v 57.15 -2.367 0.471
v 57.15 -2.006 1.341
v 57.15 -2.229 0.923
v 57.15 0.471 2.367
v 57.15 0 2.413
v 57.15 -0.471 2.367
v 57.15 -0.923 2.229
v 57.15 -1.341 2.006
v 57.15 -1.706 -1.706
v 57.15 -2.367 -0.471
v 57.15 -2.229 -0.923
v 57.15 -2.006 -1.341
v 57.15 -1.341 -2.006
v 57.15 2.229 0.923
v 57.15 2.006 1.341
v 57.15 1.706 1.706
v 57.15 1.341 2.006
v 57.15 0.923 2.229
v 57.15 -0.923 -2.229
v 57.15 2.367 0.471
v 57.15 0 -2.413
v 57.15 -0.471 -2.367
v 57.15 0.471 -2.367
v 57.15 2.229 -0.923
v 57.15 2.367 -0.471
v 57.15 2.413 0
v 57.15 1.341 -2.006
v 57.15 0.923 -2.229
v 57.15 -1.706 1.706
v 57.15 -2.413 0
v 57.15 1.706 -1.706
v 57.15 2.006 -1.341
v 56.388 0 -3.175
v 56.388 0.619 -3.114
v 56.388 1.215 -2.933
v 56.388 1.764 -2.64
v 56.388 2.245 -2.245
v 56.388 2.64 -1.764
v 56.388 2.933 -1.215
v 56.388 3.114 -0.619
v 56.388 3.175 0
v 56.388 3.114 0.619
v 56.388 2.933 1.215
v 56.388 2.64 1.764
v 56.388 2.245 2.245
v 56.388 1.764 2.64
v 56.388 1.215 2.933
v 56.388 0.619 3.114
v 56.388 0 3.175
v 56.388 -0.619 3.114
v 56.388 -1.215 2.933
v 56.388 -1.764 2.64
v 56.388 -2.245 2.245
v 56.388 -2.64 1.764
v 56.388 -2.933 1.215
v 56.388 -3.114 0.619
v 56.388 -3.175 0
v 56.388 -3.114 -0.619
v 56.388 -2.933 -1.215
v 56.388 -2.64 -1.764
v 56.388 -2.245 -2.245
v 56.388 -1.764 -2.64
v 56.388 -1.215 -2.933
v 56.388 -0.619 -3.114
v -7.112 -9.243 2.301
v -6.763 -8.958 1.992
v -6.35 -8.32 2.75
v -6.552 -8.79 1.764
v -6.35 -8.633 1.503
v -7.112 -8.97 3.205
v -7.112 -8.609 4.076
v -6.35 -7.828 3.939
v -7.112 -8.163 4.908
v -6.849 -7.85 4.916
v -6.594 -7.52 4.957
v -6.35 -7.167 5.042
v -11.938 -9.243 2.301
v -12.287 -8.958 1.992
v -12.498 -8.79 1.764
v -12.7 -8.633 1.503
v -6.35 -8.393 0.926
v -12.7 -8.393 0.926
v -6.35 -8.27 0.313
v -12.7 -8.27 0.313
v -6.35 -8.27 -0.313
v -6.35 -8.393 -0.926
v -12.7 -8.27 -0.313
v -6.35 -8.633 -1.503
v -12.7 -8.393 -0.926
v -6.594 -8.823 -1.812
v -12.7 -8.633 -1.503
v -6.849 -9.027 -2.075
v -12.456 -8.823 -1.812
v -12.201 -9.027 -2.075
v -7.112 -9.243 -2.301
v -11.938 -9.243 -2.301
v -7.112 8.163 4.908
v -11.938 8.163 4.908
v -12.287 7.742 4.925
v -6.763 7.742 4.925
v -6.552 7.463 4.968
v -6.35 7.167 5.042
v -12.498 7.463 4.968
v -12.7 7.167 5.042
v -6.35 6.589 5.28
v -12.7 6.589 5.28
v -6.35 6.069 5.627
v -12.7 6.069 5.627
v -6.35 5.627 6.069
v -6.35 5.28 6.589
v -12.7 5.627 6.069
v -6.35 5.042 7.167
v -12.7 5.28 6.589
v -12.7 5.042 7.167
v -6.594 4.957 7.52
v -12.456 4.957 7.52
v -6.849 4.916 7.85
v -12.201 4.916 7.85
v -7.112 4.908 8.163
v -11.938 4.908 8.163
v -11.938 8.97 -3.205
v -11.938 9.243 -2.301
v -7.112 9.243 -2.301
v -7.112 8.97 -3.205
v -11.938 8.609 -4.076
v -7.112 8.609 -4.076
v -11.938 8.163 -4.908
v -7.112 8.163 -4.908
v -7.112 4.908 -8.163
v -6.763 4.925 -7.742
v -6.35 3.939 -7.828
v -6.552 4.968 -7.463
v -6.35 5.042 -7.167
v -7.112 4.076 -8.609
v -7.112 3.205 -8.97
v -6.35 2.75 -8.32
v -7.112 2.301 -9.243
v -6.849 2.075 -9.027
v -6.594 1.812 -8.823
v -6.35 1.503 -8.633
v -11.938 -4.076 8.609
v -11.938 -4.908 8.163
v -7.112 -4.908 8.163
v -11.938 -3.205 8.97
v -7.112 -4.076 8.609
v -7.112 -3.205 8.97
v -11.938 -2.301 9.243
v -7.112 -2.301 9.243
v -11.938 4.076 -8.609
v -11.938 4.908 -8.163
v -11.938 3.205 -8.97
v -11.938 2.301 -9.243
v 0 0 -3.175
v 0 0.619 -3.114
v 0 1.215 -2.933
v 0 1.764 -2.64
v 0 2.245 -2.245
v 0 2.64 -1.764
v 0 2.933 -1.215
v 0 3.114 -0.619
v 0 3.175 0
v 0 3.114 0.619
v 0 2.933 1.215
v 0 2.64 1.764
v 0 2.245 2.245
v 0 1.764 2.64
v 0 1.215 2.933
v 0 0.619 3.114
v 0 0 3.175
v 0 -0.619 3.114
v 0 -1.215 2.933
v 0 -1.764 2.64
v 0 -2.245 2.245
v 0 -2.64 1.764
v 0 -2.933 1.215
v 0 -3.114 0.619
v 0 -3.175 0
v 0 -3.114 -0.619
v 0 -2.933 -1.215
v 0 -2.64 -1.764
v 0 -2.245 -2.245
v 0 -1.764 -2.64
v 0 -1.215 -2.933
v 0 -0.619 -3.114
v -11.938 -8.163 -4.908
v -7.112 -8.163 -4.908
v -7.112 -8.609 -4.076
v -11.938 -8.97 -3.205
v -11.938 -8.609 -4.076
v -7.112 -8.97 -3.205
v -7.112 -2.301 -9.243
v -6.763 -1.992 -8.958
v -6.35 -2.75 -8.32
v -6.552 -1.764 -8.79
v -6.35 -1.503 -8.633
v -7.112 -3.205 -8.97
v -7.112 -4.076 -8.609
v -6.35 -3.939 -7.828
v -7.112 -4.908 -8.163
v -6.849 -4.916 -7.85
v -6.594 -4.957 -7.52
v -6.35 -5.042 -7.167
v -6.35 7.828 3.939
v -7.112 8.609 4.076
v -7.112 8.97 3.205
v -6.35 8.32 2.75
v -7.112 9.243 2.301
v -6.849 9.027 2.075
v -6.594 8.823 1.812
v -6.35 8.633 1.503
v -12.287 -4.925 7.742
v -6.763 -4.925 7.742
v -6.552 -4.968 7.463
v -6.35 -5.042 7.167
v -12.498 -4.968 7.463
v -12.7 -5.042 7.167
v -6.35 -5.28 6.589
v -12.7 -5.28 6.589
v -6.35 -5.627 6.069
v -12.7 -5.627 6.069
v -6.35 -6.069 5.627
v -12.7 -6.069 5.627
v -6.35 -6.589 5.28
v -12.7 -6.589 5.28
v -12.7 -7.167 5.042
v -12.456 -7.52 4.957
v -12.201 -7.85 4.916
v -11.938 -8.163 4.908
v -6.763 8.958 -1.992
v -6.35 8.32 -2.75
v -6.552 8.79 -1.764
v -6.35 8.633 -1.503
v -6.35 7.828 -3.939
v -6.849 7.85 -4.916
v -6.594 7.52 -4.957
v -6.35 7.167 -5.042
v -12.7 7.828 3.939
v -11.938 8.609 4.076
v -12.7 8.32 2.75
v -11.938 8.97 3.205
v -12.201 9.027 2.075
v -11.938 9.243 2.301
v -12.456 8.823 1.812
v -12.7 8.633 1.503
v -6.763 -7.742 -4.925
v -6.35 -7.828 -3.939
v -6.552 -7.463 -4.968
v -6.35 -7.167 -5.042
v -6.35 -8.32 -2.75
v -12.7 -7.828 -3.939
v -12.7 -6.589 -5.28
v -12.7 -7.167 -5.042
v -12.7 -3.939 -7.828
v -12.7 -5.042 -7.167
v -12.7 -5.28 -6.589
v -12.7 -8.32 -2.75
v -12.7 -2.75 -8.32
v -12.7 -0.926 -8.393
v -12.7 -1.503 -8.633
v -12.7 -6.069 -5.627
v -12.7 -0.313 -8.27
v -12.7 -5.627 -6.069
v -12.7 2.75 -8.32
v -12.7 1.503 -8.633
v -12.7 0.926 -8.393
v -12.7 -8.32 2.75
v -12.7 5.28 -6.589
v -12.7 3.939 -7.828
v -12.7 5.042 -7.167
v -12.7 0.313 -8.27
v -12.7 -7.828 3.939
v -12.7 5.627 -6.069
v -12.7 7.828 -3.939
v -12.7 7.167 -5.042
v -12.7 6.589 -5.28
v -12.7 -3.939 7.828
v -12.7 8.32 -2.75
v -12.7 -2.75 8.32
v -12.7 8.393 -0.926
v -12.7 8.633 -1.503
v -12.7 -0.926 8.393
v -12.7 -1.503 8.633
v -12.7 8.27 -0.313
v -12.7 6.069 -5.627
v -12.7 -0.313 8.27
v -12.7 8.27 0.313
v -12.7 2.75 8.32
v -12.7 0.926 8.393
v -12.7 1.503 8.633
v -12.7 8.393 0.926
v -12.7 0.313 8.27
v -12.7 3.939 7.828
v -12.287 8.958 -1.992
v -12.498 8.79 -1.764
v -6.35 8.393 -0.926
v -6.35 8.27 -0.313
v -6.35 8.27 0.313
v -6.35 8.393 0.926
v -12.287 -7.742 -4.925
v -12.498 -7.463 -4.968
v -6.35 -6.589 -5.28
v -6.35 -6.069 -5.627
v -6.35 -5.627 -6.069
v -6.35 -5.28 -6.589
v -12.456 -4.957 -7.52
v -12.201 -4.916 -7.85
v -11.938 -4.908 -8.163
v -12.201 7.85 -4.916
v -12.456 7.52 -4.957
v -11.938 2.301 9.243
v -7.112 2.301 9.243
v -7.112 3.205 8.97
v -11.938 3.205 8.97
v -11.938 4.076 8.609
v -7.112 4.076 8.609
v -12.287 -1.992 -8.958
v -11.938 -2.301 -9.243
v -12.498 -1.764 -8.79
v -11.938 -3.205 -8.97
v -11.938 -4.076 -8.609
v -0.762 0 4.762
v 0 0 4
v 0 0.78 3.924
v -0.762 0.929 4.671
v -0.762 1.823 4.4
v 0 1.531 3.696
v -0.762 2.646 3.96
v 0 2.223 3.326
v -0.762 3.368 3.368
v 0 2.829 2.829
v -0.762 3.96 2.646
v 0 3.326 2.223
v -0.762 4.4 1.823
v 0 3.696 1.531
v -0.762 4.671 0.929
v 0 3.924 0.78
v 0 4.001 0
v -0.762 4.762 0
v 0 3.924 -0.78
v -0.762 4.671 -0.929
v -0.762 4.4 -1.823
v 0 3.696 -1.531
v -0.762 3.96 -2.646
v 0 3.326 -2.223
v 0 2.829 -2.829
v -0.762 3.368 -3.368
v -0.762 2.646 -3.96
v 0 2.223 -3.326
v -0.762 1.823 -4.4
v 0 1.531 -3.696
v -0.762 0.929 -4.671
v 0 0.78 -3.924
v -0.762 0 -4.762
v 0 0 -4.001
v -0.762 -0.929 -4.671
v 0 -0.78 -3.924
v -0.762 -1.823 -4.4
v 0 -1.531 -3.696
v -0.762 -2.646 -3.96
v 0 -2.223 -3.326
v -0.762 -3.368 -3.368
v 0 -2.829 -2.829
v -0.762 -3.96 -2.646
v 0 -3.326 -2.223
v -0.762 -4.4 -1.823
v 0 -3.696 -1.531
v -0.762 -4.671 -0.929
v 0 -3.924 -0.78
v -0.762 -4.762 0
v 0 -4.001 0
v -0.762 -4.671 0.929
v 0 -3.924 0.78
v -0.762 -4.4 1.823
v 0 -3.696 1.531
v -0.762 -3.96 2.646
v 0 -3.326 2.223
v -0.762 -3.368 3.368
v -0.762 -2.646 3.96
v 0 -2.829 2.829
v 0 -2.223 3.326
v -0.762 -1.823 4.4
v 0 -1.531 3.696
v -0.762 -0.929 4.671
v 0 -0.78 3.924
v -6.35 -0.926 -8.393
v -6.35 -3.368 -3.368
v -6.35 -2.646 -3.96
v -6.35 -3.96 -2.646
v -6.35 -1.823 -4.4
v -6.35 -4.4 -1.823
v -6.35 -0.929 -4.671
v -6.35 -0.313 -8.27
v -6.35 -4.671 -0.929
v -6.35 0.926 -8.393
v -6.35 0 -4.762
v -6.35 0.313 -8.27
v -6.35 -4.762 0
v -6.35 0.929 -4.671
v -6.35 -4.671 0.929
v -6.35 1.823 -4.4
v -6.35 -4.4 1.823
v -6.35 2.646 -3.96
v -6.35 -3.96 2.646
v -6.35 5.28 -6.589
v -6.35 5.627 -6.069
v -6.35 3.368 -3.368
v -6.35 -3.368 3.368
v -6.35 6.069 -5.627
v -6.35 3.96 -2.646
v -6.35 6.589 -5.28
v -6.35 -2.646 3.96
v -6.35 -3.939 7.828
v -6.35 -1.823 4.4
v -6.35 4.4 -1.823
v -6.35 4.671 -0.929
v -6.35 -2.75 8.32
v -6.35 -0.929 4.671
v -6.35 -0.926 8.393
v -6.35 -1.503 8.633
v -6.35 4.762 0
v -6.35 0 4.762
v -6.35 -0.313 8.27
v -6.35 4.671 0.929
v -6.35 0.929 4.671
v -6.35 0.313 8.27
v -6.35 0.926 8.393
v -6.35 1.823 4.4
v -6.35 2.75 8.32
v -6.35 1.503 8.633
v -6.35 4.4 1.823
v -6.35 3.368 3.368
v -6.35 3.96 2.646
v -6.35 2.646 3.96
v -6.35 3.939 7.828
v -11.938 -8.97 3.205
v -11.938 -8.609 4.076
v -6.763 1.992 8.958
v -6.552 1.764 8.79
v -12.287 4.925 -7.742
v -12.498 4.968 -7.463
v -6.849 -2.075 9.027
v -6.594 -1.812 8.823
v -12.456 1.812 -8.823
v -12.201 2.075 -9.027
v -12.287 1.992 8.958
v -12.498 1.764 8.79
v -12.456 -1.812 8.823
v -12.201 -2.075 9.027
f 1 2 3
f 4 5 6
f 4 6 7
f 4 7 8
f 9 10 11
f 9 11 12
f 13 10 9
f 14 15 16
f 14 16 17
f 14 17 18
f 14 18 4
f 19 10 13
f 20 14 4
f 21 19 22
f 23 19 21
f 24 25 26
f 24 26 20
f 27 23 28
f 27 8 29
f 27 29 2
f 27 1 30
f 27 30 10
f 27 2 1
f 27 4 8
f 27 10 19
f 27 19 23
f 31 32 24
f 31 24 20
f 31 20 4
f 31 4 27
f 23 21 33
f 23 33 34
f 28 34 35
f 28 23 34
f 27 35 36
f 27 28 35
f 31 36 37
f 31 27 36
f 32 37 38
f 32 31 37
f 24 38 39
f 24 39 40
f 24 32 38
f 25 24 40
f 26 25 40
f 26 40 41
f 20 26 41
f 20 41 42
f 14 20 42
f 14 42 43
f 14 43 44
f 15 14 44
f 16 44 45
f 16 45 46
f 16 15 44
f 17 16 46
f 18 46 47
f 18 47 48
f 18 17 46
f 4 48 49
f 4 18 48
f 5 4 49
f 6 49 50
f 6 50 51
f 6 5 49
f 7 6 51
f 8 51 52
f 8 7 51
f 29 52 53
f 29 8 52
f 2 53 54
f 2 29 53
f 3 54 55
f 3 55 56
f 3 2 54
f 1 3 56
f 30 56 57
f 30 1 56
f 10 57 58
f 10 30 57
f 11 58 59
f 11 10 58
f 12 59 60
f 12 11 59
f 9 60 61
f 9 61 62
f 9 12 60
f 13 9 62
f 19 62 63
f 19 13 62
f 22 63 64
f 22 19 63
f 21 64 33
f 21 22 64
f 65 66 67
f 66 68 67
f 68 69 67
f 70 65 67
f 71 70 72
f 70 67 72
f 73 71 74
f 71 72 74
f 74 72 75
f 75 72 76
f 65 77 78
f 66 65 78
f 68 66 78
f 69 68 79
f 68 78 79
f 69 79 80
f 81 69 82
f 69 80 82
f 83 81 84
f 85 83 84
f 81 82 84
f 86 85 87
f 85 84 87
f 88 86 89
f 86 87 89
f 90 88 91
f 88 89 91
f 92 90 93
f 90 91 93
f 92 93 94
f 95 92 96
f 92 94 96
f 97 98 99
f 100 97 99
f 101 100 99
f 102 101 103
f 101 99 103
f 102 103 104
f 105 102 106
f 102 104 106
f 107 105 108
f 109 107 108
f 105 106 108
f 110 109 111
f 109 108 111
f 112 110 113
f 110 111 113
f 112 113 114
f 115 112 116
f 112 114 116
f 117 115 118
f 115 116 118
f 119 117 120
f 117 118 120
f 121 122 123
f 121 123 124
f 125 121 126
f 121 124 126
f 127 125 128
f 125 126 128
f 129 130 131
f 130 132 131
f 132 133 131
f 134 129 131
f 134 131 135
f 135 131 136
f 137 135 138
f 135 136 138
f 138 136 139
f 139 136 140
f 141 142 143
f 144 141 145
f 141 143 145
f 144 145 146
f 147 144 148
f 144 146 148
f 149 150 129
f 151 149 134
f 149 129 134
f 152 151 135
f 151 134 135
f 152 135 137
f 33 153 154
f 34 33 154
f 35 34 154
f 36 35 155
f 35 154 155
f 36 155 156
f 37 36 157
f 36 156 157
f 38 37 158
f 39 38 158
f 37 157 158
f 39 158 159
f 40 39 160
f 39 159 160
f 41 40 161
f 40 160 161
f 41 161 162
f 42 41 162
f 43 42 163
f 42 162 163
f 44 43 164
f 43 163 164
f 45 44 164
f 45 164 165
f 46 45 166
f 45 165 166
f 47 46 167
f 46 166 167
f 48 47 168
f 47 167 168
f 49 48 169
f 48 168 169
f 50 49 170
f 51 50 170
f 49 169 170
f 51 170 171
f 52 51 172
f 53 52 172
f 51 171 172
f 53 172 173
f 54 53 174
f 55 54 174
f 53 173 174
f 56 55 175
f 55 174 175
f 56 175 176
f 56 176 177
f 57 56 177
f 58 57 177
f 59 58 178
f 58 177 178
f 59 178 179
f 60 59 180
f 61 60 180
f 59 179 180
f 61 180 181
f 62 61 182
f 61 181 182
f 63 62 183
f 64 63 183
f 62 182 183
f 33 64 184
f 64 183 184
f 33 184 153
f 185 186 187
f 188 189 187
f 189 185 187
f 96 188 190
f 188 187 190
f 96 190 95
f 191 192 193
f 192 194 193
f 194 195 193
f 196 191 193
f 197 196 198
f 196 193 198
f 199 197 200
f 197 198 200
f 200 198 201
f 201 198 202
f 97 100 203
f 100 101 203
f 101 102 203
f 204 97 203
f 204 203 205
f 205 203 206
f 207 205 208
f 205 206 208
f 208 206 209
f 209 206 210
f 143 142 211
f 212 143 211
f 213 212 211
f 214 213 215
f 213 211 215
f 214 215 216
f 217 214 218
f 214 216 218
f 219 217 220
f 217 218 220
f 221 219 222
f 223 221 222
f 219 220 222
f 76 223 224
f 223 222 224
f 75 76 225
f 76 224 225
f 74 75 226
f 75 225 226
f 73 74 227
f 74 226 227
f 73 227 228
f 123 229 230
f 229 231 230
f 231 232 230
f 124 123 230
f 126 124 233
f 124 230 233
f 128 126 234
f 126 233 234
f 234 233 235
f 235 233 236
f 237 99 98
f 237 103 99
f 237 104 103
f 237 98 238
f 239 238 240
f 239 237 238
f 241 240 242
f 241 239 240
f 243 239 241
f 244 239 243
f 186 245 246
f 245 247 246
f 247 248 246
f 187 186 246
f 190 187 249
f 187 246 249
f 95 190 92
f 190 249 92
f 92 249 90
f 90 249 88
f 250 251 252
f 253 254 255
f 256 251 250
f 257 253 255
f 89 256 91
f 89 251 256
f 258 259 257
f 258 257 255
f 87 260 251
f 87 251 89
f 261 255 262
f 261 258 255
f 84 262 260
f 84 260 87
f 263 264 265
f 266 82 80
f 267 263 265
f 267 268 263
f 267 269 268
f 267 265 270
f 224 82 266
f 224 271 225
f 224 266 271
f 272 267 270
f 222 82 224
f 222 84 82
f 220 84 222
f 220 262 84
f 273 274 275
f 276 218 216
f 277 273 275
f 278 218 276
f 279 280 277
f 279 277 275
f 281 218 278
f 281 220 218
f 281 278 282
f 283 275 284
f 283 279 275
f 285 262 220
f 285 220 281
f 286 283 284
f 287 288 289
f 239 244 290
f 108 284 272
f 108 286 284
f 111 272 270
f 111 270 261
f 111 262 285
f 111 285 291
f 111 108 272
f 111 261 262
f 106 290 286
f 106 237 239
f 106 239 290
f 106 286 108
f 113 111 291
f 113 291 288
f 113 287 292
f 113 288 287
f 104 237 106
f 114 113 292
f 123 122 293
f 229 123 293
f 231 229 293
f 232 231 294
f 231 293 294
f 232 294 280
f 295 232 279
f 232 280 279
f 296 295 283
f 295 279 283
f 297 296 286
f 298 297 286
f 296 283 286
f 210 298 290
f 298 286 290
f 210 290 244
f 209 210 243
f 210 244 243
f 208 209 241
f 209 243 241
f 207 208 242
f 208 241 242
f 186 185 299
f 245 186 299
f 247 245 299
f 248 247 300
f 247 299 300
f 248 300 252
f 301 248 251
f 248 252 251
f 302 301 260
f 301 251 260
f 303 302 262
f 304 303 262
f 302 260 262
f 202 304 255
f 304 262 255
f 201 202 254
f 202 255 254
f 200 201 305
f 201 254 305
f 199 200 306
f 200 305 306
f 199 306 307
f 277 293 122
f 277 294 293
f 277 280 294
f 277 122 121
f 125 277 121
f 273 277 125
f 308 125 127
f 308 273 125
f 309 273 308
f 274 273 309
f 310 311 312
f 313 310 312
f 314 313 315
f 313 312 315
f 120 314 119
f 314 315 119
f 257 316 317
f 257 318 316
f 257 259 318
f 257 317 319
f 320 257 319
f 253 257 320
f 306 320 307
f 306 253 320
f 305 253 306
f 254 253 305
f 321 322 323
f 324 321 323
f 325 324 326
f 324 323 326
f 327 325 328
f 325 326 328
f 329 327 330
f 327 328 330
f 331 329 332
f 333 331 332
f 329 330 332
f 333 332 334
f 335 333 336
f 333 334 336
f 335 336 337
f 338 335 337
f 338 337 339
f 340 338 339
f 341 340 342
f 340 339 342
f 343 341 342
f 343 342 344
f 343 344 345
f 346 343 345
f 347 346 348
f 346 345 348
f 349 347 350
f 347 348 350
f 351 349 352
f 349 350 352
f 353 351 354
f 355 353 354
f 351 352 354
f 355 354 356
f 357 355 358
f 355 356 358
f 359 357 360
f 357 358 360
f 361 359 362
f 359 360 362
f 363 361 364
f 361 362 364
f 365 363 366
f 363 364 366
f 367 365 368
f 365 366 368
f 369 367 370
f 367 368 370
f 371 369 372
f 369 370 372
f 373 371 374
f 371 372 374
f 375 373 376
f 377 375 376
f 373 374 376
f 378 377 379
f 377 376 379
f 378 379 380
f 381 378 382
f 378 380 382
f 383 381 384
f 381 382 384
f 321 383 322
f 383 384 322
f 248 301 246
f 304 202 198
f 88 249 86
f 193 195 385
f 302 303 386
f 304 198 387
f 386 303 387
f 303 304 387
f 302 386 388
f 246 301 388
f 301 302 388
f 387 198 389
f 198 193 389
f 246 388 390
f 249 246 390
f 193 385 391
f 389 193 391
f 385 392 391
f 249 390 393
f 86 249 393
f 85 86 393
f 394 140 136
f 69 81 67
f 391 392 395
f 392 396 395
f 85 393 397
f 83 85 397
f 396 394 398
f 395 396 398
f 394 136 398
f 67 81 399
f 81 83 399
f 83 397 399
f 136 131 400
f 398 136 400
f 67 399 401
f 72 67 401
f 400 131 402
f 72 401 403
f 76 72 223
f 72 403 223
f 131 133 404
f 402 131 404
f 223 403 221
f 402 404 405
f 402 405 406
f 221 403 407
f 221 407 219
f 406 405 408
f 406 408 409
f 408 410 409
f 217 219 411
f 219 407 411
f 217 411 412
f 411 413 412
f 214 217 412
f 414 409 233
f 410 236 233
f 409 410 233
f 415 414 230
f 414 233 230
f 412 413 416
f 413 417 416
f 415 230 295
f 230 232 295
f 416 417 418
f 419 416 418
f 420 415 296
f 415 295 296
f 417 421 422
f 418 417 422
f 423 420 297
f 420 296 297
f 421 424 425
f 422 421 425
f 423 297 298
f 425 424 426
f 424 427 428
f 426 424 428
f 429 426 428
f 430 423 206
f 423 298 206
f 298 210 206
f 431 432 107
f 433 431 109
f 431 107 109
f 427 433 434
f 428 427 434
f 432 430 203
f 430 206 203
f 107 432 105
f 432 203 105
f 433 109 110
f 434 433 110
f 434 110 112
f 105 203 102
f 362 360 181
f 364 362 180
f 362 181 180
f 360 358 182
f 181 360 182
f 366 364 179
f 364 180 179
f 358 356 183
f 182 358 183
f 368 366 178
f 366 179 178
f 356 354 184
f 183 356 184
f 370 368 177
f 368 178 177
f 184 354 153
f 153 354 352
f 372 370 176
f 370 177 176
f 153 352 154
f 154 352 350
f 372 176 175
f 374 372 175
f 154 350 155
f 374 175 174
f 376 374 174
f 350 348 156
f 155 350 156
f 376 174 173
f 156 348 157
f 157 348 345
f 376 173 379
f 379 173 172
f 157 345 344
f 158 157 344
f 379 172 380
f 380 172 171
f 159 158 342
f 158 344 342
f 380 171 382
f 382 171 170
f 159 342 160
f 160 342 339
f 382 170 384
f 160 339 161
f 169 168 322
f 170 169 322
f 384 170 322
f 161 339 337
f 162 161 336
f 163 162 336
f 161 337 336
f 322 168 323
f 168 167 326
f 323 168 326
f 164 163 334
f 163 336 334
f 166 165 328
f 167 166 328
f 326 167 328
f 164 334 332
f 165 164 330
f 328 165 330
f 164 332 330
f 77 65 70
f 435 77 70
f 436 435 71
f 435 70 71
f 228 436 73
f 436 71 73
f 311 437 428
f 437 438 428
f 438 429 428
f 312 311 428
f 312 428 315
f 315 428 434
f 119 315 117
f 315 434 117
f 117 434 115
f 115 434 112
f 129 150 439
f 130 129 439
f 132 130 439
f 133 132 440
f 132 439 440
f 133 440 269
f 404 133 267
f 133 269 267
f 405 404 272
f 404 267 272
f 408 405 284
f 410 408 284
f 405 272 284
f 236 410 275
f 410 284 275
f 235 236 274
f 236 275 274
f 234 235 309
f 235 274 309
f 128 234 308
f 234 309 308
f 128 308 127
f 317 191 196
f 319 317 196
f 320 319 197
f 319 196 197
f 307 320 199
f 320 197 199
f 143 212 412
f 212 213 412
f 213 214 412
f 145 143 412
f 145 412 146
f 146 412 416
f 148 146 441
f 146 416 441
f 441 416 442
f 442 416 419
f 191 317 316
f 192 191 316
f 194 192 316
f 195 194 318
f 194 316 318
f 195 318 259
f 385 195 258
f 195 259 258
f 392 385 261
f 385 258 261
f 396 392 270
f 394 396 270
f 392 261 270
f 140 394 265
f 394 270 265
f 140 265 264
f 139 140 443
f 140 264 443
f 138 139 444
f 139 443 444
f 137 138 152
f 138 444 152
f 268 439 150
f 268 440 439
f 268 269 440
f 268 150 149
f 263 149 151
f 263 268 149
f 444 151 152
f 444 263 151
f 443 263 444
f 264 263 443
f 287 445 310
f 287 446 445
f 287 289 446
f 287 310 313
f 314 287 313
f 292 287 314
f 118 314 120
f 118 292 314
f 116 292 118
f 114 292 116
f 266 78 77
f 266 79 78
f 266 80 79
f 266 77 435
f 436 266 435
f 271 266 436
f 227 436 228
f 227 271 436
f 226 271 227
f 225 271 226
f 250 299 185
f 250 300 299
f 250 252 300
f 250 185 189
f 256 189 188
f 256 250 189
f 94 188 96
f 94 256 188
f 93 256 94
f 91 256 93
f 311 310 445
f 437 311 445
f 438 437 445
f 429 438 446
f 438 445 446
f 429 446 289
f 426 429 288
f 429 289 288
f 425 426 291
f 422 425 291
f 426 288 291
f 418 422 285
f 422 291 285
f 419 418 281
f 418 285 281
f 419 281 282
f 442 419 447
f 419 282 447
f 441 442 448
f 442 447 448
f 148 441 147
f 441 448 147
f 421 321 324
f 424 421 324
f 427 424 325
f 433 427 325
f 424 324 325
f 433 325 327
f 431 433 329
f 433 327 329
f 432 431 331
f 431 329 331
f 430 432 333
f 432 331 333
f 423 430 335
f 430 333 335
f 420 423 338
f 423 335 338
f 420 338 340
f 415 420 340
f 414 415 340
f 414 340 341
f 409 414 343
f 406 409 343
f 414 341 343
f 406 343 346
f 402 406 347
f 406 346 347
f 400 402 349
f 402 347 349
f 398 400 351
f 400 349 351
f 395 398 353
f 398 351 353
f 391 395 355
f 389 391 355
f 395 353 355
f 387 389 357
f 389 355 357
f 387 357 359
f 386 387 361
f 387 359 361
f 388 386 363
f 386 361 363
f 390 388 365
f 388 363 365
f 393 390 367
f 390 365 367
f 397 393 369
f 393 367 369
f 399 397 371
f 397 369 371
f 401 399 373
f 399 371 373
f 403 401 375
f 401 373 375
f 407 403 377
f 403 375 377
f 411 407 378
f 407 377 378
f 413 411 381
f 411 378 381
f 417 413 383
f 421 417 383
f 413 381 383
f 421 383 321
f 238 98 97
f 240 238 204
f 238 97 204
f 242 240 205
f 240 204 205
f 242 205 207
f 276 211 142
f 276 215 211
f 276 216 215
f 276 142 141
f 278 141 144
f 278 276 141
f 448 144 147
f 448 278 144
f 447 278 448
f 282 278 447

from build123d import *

# Parameters (mm, degrees)
SKETCH1_R           = 3.175
BOSS_EXTRUDE1_DEPTH = 57.15
CHAMFER1_SIZE       = 0.762
SKETCH6_R           = 4.7625
BOSS_EXTRUDE2_DEPTH = 6.35
SKETCH7_R           = 9.525
BOSS_EXTRUDE3_DEPTH = 6.35
CHAMFER2_SIZE       = 0.762
SKETCH8_R           = 3.175
CUT_EXTRUDE1_DEPTH  = 72.137006895
CIRPATTERN1_COUNT   = 8


with BuildPart() as part:
    # Sketch1 → Boss-Extrude1 (new body)
    with BuildSketch(Plane(origin=(0, 0, 0), x_dir=(0, 0, -1), z_dir=(1, 0, 0))):
        Circle(SKETCH1_R)
    extrude(amount=BOSS_EXTRUDE1_DEPTH)

    # Chamfer1
    chamfer1_edges = [part.edges().sort_by_distance(p)[0] for p in [
        (57.15, 0, 3.175),
    ]]
    chamfer(chamfer1_edges, length=CHAMFER1_SIZE)

    # Sketch6 → Boss-Extrude2 (add)
    with BuildSketch(Plane.ZY):
        Circle(SKETCH6_R)
    extrude(amount=BOSS_EXTRUDE2_DEPTH)

    # Sketch7 → Boss-Extrude3 (add)
    with BuildSketch(Plane.ZY.offset(6.35)):
        Circle(SKETCH7_R)
    extrude(amount=BOSS_EXTRUDE3_DEPTH)

    # Chamfer2
    chamfer2_edges = [part.edges().sort_by_distance(p)[0] for p in [
        (-6.35, 0, -9.525),
        (-12.7, 0, -9.525),
        (0, 0, -4.7625),
    ]]
    chamfer(chamfer2_edges, length=CHAMFER2_SIZE)

    # Sketch8 → Cut-Extrude1 (cut, through all)
    with BuildSketch(Plane.ZY.offset(12.7)):
        with Locations((0, 11.43)):
            Circle(SKETCH8_R)
    cut_extrude1 = extrude(amount=-CUT_EXTRUDE1_DEPTH, mode=Mode.SUBTRACT)

    # CirPattern1: Cut-Extrude1 ×8 about axis
    cirpattern1_axis = Axis((0, 0, 0), (1, 0, 0))
    for i in range(1, CIRPATTERN1_COUNT):
        add(cut_extrude1.rotate(cirpattern1_axis, i * 360 / CIRPATTERN1_COUNT), mode=Mode.SUBTRACT)


solid = part.part
